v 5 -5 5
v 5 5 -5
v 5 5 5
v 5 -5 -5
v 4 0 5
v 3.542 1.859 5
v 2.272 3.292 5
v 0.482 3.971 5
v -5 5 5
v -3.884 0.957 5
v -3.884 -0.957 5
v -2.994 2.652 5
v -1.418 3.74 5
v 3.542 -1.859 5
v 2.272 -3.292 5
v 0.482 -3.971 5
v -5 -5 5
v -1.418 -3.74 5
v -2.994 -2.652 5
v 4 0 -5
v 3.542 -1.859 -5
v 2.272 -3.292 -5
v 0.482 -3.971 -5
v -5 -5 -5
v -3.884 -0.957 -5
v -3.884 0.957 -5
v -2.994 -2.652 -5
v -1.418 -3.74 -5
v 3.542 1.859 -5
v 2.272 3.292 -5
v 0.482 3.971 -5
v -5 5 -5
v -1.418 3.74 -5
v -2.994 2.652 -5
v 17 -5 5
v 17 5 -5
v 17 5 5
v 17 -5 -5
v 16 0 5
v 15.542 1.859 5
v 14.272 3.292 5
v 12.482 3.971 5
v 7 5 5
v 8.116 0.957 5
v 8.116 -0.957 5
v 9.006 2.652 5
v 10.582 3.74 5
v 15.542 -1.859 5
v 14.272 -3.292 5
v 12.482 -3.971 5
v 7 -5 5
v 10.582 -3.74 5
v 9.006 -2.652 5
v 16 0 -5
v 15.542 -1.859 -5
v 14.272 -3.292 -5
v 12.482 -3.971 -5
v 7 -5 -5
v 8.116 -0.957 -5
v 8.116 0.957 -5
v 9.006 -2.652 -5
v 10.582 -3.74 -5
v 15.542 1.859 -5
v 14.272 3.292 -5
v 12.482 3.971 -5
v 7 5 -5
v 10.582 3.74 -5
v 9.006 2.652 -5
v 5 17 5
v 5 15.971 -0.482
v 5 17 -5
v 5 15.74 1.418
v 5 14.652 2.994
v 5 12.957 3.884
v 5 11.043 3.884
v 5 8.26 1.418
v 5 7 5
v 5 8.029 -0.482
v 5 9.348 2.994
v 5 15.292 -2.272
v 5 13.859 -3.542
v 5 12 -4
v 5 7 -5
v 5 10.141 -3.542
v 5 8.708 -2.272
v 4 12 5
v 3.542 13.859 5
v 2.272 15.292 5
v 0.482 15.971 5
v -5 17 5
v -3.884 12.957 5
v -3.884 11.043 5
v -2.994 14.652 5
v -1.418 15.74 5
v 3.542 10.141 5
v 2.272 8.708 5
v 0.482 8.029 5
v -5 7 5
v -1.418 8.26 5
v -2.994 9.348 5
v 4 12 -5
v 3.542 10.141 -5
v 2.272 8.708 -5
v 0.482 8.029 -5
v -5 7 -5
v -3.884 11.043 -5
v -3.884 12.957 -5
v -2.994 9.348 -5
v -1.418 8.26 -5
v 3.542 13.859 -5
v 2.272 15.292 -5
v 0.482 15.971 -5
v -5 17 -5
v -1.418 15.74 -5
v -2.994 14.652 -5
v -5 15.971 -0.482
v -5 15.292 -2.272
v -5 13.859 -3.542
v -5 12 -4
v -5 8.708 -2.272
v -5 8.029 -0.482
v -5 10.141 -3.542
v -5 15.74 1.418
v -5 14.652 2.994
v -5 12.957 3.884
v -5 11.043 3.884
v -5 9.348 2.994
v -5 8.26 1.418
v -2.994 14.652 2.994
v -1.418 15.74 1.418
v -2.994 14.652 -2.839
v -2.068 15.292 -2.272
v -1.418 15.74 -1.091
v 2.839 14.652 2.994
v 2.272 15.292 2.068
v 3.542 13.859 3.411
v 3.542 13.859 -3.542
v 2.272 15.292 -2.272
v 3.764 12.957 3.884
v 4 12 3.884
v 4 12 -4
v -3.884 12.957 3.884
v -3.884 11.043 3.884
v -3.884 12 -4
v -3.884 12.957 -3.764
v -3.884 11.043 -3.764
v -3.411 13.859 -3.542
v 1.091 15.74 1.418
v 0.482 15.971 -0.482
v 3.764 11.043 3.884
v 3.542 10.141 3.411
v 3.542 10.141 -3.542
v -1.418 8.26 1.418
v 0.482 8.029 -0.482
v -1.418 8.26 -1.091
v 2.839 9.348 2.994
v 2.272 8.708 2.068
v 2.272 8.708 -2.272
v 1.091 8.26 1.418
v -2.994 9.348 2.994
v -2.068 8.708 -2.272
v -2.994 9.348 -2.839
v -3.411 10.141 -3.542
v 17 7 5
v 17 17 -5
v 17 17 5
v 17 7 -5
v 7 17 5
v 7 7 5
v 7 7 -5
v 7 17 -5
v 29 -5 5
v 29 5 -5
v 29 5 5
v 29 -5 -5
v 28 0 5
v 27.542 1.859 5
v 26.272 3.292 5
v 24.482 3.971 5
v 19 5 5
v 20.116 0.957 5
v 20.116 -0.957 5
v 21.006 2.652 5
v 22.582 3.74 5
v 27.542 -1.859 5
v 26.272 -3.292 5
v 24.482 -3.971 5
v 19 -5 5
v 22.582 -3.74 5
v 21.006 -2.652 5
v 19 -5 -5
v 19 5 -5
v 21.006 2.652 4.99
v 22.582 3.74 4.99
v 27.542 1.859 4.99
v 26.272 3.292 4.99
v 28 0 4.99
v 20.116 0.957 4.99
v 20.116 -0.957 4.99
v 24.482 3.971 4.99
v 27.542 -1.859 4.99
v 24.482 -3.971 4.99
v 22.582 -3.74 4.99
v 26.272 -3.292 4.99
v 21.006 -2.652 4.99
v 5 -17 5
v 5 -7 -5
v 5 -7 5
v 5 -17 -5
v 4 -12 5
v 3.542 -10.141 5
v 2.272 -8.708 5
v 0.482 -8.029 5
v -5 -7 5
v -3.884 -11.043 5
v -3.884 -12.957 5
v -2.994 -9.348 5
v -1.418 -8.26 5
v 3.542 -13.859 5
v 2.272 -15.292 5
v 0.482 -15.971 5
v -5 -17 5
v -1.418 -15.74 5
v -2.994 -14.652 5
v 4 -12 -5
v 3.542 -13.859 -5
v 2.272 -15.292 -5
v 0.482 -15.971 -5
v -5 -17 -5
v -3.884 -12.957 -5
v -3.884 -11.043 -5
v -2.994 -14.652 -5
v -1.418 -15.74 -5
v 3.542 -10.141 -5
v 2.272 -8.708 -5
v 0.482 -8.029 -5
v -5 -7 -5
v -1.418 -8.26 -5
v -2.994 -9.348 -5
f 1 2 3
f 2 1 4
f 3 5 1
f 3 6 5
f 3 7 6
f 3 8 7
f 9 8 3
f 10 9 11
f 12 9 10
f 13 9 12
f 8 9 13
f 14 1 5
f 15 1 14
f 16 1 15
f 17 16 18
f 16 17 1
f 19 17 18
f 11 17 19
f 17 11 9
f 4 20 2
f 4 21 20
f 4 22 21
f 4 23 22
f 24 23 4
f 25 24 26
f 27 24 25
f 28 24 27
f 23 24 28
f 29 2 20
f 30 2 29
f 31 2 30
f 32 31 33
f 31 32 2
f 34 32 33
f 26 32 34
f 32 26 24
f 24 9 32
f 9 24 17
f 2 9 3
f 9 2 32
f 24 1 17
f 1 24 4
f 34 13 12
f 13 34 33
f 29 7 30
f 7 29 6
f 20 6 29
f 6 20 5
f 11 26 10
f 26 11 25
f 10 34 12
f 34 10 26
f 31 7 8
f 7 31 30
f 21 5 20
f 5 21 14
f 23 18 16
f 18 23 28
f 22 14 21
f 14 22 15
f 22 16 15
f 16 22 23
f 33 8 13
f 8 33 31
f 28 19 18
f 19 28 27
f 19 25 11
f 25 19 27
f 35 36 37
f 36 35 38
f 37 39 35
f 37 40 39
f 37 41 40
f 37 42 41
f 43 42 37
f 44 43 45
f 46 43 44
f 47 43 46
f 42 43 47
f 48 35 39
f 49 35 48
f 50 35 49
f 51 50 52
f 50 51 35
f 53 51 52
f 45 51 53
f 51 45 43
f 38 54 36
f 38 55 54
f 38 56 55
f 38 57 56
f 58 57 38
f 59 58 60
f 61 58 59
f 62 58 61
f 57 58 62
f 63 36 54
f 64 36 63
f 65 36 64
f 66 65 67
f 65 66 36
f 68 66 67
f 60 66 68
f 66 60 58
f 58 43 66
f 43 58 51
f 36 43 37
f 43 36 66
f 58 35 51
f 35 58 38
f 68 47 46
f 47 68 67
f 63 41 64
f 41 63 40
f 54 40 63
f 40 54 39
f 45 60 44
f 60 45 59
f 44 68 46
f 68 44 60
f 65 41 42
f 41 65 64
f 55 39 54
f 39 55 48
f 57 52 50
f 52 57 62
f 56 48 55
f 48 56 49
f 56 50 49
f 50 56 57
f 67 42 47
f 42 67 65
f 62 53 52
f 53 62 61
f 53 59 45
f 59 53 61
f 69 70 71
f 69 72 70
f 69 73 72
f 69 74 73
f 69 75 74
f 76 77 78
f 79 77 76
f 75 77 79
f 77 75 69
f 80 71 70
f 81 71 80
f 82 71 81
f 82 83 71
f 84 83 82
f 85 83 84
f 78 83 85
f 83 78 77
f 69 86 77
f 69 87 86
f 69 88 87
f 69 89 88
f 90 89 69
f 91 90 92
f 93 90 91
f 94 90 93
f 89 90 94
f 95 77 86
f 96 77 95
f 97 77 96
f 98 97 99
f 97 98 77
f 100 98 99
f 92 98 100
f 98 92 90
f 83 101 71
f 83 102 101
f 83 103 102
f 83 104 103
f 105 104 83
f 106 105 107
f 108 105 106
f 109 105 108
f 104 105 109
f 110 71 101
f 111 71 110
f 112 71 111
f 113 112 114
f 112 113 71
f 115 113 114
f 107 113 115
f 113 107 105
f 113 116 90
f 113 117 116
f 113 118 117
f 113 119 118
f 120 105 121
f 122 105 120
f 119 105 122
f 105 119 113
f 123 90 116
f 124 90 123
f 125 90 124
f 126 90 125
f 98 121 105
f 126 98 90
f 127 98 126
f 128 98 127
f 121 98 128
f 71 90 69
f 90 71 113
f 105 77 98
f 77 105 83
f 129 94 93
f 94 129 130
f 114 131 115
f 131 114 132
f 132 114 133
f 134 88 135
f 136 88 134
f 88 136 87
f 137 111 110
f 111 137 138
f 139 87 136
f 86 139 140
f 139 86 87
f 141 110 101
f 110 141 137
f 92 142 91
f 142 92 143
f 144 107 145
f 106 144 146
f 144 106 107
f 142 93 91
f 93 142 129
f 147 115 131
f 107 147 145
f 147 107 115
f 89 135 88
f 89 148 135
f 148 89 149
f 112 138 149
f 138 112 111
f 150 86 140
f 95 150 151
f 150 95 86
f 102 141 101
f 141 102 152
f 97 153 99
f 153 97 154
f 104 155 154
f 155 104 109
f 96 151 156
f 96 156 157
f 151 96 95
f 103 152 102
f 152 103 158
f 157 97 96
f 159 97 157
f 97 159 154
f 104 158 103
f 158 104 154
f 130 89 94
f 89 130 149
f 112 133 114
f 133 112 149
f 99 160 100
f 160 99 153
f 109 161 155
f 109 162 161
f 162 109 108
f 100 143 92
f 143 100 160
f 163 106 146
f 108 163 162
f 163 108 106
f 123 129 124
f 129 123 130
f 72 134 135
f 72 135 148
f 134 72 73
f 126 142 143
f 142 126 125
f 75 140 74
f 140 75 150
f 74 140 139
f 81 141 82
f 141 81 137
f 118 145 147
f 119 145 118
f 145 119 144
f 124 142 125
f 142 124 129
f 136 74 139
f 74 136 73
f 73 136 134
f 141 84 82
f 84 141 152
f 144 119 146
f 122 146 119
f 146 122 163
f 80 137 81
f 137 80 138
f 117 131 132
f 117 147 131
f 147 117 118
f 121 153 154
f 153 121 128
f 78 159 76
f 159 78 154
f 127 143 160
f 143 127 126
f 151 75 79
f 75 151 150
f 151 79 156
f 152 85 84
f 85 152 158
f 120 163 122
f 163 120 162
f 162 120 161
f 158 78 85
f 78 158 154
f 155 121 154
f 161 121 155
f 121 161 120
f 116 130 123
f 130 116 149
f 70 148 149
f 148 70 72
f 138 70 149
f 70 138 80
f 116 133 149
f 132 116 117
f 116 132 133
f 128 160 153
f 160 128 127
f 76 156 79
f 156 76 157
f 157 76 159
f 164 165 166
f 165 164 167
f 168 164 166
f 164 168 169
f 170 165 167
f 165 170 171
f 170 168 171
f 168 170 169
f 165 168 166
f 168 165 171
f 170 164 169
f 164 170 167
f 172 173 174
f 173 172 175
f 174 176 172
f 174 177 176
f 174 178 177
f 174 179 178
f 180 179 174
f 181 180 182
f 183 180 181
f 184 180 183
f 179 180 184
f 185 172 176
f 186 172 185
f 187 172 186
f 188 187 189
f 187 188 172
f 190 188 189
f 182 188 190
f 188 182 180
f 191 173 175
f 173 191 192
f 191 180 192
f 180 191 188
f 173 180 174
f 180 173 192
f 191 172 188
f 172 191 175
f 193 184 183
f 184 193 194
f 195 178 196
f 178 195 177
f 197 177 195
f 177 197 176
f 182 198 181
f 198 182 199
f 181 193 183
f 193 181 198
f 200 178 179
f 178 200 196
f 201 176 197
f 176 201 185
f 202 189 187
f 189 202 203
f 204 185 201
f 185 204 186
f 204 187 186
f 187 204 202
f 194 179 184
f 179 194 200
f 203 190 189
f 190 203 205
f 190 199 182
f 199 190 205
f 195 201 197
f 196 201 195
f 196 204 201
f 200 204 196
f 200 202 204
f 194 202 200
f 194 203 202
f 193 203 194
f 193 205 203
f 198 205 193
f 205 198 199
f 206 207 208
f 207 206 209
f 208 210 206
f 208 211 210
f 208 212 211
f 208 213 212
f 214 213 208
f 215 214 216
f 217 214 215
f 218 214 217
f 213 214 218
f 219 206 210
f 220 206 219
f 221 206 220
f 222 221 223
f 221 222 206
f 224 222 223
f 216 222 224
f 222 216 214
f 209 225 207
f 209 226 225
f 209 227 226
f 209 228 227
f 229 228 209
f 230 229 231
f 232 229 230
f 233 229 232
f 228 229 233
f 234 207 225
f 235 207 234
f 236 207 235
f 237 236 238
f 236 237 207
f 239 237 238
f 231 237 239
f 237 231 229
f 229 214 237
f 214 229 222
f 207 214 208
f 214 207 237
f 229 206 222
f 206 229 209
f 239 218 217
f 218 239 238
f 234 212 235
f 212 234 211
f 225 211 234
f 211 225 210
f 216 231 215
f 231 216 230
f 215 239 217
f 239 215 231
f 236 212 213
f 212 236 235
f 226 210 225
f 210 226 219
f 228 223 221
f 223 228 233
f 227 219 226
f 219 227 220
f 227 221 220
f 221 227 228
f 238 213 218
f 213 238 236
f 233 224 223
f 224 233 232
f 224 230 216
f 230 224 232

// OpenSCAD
// Empty
difference();
// No children
difference() { }

difference() {
  cube([10,10,10], center=true);
  cylinder(r=4, h=20, center=true);
}

translate([12,0,0]) difference() {
  cube([10,10,10], center=true);
  cylinder(r=4, h=10.5, center=true);
}

translate([0,12,0]) difference() {
  cube([10,10,10], center=true);
  cylinder(r=4, h=11, center=true);
  rotate([0,90,0]) cylinder(r=4, h=11, center=true);
}

translate([12,12,0]) difference() {
  cube([10,10,10], center=true);
  translate([0,0,7.01]) cylinder(r=4, h=4, center=true);
}

translate([24,0,0]) difference() {
  cube([10,10,10], center=true);
  translate([0,0,6.99]) cylinder(r=4, h=4, center=true);
}

// Subtracting something from nothing
translate([24,12,0]) difference() {
  cube([0,10,10], center=true);
  # cylinder(r=4, h=20, center=true);
}

// Non-geometry (echo) statement as first child should be ignored
translate([0,-12,0]) difference() {
  echo("difference-tests");
  cube([10,10,10], center=true);
  cylinder(r=4, h=20, center=true);
}
